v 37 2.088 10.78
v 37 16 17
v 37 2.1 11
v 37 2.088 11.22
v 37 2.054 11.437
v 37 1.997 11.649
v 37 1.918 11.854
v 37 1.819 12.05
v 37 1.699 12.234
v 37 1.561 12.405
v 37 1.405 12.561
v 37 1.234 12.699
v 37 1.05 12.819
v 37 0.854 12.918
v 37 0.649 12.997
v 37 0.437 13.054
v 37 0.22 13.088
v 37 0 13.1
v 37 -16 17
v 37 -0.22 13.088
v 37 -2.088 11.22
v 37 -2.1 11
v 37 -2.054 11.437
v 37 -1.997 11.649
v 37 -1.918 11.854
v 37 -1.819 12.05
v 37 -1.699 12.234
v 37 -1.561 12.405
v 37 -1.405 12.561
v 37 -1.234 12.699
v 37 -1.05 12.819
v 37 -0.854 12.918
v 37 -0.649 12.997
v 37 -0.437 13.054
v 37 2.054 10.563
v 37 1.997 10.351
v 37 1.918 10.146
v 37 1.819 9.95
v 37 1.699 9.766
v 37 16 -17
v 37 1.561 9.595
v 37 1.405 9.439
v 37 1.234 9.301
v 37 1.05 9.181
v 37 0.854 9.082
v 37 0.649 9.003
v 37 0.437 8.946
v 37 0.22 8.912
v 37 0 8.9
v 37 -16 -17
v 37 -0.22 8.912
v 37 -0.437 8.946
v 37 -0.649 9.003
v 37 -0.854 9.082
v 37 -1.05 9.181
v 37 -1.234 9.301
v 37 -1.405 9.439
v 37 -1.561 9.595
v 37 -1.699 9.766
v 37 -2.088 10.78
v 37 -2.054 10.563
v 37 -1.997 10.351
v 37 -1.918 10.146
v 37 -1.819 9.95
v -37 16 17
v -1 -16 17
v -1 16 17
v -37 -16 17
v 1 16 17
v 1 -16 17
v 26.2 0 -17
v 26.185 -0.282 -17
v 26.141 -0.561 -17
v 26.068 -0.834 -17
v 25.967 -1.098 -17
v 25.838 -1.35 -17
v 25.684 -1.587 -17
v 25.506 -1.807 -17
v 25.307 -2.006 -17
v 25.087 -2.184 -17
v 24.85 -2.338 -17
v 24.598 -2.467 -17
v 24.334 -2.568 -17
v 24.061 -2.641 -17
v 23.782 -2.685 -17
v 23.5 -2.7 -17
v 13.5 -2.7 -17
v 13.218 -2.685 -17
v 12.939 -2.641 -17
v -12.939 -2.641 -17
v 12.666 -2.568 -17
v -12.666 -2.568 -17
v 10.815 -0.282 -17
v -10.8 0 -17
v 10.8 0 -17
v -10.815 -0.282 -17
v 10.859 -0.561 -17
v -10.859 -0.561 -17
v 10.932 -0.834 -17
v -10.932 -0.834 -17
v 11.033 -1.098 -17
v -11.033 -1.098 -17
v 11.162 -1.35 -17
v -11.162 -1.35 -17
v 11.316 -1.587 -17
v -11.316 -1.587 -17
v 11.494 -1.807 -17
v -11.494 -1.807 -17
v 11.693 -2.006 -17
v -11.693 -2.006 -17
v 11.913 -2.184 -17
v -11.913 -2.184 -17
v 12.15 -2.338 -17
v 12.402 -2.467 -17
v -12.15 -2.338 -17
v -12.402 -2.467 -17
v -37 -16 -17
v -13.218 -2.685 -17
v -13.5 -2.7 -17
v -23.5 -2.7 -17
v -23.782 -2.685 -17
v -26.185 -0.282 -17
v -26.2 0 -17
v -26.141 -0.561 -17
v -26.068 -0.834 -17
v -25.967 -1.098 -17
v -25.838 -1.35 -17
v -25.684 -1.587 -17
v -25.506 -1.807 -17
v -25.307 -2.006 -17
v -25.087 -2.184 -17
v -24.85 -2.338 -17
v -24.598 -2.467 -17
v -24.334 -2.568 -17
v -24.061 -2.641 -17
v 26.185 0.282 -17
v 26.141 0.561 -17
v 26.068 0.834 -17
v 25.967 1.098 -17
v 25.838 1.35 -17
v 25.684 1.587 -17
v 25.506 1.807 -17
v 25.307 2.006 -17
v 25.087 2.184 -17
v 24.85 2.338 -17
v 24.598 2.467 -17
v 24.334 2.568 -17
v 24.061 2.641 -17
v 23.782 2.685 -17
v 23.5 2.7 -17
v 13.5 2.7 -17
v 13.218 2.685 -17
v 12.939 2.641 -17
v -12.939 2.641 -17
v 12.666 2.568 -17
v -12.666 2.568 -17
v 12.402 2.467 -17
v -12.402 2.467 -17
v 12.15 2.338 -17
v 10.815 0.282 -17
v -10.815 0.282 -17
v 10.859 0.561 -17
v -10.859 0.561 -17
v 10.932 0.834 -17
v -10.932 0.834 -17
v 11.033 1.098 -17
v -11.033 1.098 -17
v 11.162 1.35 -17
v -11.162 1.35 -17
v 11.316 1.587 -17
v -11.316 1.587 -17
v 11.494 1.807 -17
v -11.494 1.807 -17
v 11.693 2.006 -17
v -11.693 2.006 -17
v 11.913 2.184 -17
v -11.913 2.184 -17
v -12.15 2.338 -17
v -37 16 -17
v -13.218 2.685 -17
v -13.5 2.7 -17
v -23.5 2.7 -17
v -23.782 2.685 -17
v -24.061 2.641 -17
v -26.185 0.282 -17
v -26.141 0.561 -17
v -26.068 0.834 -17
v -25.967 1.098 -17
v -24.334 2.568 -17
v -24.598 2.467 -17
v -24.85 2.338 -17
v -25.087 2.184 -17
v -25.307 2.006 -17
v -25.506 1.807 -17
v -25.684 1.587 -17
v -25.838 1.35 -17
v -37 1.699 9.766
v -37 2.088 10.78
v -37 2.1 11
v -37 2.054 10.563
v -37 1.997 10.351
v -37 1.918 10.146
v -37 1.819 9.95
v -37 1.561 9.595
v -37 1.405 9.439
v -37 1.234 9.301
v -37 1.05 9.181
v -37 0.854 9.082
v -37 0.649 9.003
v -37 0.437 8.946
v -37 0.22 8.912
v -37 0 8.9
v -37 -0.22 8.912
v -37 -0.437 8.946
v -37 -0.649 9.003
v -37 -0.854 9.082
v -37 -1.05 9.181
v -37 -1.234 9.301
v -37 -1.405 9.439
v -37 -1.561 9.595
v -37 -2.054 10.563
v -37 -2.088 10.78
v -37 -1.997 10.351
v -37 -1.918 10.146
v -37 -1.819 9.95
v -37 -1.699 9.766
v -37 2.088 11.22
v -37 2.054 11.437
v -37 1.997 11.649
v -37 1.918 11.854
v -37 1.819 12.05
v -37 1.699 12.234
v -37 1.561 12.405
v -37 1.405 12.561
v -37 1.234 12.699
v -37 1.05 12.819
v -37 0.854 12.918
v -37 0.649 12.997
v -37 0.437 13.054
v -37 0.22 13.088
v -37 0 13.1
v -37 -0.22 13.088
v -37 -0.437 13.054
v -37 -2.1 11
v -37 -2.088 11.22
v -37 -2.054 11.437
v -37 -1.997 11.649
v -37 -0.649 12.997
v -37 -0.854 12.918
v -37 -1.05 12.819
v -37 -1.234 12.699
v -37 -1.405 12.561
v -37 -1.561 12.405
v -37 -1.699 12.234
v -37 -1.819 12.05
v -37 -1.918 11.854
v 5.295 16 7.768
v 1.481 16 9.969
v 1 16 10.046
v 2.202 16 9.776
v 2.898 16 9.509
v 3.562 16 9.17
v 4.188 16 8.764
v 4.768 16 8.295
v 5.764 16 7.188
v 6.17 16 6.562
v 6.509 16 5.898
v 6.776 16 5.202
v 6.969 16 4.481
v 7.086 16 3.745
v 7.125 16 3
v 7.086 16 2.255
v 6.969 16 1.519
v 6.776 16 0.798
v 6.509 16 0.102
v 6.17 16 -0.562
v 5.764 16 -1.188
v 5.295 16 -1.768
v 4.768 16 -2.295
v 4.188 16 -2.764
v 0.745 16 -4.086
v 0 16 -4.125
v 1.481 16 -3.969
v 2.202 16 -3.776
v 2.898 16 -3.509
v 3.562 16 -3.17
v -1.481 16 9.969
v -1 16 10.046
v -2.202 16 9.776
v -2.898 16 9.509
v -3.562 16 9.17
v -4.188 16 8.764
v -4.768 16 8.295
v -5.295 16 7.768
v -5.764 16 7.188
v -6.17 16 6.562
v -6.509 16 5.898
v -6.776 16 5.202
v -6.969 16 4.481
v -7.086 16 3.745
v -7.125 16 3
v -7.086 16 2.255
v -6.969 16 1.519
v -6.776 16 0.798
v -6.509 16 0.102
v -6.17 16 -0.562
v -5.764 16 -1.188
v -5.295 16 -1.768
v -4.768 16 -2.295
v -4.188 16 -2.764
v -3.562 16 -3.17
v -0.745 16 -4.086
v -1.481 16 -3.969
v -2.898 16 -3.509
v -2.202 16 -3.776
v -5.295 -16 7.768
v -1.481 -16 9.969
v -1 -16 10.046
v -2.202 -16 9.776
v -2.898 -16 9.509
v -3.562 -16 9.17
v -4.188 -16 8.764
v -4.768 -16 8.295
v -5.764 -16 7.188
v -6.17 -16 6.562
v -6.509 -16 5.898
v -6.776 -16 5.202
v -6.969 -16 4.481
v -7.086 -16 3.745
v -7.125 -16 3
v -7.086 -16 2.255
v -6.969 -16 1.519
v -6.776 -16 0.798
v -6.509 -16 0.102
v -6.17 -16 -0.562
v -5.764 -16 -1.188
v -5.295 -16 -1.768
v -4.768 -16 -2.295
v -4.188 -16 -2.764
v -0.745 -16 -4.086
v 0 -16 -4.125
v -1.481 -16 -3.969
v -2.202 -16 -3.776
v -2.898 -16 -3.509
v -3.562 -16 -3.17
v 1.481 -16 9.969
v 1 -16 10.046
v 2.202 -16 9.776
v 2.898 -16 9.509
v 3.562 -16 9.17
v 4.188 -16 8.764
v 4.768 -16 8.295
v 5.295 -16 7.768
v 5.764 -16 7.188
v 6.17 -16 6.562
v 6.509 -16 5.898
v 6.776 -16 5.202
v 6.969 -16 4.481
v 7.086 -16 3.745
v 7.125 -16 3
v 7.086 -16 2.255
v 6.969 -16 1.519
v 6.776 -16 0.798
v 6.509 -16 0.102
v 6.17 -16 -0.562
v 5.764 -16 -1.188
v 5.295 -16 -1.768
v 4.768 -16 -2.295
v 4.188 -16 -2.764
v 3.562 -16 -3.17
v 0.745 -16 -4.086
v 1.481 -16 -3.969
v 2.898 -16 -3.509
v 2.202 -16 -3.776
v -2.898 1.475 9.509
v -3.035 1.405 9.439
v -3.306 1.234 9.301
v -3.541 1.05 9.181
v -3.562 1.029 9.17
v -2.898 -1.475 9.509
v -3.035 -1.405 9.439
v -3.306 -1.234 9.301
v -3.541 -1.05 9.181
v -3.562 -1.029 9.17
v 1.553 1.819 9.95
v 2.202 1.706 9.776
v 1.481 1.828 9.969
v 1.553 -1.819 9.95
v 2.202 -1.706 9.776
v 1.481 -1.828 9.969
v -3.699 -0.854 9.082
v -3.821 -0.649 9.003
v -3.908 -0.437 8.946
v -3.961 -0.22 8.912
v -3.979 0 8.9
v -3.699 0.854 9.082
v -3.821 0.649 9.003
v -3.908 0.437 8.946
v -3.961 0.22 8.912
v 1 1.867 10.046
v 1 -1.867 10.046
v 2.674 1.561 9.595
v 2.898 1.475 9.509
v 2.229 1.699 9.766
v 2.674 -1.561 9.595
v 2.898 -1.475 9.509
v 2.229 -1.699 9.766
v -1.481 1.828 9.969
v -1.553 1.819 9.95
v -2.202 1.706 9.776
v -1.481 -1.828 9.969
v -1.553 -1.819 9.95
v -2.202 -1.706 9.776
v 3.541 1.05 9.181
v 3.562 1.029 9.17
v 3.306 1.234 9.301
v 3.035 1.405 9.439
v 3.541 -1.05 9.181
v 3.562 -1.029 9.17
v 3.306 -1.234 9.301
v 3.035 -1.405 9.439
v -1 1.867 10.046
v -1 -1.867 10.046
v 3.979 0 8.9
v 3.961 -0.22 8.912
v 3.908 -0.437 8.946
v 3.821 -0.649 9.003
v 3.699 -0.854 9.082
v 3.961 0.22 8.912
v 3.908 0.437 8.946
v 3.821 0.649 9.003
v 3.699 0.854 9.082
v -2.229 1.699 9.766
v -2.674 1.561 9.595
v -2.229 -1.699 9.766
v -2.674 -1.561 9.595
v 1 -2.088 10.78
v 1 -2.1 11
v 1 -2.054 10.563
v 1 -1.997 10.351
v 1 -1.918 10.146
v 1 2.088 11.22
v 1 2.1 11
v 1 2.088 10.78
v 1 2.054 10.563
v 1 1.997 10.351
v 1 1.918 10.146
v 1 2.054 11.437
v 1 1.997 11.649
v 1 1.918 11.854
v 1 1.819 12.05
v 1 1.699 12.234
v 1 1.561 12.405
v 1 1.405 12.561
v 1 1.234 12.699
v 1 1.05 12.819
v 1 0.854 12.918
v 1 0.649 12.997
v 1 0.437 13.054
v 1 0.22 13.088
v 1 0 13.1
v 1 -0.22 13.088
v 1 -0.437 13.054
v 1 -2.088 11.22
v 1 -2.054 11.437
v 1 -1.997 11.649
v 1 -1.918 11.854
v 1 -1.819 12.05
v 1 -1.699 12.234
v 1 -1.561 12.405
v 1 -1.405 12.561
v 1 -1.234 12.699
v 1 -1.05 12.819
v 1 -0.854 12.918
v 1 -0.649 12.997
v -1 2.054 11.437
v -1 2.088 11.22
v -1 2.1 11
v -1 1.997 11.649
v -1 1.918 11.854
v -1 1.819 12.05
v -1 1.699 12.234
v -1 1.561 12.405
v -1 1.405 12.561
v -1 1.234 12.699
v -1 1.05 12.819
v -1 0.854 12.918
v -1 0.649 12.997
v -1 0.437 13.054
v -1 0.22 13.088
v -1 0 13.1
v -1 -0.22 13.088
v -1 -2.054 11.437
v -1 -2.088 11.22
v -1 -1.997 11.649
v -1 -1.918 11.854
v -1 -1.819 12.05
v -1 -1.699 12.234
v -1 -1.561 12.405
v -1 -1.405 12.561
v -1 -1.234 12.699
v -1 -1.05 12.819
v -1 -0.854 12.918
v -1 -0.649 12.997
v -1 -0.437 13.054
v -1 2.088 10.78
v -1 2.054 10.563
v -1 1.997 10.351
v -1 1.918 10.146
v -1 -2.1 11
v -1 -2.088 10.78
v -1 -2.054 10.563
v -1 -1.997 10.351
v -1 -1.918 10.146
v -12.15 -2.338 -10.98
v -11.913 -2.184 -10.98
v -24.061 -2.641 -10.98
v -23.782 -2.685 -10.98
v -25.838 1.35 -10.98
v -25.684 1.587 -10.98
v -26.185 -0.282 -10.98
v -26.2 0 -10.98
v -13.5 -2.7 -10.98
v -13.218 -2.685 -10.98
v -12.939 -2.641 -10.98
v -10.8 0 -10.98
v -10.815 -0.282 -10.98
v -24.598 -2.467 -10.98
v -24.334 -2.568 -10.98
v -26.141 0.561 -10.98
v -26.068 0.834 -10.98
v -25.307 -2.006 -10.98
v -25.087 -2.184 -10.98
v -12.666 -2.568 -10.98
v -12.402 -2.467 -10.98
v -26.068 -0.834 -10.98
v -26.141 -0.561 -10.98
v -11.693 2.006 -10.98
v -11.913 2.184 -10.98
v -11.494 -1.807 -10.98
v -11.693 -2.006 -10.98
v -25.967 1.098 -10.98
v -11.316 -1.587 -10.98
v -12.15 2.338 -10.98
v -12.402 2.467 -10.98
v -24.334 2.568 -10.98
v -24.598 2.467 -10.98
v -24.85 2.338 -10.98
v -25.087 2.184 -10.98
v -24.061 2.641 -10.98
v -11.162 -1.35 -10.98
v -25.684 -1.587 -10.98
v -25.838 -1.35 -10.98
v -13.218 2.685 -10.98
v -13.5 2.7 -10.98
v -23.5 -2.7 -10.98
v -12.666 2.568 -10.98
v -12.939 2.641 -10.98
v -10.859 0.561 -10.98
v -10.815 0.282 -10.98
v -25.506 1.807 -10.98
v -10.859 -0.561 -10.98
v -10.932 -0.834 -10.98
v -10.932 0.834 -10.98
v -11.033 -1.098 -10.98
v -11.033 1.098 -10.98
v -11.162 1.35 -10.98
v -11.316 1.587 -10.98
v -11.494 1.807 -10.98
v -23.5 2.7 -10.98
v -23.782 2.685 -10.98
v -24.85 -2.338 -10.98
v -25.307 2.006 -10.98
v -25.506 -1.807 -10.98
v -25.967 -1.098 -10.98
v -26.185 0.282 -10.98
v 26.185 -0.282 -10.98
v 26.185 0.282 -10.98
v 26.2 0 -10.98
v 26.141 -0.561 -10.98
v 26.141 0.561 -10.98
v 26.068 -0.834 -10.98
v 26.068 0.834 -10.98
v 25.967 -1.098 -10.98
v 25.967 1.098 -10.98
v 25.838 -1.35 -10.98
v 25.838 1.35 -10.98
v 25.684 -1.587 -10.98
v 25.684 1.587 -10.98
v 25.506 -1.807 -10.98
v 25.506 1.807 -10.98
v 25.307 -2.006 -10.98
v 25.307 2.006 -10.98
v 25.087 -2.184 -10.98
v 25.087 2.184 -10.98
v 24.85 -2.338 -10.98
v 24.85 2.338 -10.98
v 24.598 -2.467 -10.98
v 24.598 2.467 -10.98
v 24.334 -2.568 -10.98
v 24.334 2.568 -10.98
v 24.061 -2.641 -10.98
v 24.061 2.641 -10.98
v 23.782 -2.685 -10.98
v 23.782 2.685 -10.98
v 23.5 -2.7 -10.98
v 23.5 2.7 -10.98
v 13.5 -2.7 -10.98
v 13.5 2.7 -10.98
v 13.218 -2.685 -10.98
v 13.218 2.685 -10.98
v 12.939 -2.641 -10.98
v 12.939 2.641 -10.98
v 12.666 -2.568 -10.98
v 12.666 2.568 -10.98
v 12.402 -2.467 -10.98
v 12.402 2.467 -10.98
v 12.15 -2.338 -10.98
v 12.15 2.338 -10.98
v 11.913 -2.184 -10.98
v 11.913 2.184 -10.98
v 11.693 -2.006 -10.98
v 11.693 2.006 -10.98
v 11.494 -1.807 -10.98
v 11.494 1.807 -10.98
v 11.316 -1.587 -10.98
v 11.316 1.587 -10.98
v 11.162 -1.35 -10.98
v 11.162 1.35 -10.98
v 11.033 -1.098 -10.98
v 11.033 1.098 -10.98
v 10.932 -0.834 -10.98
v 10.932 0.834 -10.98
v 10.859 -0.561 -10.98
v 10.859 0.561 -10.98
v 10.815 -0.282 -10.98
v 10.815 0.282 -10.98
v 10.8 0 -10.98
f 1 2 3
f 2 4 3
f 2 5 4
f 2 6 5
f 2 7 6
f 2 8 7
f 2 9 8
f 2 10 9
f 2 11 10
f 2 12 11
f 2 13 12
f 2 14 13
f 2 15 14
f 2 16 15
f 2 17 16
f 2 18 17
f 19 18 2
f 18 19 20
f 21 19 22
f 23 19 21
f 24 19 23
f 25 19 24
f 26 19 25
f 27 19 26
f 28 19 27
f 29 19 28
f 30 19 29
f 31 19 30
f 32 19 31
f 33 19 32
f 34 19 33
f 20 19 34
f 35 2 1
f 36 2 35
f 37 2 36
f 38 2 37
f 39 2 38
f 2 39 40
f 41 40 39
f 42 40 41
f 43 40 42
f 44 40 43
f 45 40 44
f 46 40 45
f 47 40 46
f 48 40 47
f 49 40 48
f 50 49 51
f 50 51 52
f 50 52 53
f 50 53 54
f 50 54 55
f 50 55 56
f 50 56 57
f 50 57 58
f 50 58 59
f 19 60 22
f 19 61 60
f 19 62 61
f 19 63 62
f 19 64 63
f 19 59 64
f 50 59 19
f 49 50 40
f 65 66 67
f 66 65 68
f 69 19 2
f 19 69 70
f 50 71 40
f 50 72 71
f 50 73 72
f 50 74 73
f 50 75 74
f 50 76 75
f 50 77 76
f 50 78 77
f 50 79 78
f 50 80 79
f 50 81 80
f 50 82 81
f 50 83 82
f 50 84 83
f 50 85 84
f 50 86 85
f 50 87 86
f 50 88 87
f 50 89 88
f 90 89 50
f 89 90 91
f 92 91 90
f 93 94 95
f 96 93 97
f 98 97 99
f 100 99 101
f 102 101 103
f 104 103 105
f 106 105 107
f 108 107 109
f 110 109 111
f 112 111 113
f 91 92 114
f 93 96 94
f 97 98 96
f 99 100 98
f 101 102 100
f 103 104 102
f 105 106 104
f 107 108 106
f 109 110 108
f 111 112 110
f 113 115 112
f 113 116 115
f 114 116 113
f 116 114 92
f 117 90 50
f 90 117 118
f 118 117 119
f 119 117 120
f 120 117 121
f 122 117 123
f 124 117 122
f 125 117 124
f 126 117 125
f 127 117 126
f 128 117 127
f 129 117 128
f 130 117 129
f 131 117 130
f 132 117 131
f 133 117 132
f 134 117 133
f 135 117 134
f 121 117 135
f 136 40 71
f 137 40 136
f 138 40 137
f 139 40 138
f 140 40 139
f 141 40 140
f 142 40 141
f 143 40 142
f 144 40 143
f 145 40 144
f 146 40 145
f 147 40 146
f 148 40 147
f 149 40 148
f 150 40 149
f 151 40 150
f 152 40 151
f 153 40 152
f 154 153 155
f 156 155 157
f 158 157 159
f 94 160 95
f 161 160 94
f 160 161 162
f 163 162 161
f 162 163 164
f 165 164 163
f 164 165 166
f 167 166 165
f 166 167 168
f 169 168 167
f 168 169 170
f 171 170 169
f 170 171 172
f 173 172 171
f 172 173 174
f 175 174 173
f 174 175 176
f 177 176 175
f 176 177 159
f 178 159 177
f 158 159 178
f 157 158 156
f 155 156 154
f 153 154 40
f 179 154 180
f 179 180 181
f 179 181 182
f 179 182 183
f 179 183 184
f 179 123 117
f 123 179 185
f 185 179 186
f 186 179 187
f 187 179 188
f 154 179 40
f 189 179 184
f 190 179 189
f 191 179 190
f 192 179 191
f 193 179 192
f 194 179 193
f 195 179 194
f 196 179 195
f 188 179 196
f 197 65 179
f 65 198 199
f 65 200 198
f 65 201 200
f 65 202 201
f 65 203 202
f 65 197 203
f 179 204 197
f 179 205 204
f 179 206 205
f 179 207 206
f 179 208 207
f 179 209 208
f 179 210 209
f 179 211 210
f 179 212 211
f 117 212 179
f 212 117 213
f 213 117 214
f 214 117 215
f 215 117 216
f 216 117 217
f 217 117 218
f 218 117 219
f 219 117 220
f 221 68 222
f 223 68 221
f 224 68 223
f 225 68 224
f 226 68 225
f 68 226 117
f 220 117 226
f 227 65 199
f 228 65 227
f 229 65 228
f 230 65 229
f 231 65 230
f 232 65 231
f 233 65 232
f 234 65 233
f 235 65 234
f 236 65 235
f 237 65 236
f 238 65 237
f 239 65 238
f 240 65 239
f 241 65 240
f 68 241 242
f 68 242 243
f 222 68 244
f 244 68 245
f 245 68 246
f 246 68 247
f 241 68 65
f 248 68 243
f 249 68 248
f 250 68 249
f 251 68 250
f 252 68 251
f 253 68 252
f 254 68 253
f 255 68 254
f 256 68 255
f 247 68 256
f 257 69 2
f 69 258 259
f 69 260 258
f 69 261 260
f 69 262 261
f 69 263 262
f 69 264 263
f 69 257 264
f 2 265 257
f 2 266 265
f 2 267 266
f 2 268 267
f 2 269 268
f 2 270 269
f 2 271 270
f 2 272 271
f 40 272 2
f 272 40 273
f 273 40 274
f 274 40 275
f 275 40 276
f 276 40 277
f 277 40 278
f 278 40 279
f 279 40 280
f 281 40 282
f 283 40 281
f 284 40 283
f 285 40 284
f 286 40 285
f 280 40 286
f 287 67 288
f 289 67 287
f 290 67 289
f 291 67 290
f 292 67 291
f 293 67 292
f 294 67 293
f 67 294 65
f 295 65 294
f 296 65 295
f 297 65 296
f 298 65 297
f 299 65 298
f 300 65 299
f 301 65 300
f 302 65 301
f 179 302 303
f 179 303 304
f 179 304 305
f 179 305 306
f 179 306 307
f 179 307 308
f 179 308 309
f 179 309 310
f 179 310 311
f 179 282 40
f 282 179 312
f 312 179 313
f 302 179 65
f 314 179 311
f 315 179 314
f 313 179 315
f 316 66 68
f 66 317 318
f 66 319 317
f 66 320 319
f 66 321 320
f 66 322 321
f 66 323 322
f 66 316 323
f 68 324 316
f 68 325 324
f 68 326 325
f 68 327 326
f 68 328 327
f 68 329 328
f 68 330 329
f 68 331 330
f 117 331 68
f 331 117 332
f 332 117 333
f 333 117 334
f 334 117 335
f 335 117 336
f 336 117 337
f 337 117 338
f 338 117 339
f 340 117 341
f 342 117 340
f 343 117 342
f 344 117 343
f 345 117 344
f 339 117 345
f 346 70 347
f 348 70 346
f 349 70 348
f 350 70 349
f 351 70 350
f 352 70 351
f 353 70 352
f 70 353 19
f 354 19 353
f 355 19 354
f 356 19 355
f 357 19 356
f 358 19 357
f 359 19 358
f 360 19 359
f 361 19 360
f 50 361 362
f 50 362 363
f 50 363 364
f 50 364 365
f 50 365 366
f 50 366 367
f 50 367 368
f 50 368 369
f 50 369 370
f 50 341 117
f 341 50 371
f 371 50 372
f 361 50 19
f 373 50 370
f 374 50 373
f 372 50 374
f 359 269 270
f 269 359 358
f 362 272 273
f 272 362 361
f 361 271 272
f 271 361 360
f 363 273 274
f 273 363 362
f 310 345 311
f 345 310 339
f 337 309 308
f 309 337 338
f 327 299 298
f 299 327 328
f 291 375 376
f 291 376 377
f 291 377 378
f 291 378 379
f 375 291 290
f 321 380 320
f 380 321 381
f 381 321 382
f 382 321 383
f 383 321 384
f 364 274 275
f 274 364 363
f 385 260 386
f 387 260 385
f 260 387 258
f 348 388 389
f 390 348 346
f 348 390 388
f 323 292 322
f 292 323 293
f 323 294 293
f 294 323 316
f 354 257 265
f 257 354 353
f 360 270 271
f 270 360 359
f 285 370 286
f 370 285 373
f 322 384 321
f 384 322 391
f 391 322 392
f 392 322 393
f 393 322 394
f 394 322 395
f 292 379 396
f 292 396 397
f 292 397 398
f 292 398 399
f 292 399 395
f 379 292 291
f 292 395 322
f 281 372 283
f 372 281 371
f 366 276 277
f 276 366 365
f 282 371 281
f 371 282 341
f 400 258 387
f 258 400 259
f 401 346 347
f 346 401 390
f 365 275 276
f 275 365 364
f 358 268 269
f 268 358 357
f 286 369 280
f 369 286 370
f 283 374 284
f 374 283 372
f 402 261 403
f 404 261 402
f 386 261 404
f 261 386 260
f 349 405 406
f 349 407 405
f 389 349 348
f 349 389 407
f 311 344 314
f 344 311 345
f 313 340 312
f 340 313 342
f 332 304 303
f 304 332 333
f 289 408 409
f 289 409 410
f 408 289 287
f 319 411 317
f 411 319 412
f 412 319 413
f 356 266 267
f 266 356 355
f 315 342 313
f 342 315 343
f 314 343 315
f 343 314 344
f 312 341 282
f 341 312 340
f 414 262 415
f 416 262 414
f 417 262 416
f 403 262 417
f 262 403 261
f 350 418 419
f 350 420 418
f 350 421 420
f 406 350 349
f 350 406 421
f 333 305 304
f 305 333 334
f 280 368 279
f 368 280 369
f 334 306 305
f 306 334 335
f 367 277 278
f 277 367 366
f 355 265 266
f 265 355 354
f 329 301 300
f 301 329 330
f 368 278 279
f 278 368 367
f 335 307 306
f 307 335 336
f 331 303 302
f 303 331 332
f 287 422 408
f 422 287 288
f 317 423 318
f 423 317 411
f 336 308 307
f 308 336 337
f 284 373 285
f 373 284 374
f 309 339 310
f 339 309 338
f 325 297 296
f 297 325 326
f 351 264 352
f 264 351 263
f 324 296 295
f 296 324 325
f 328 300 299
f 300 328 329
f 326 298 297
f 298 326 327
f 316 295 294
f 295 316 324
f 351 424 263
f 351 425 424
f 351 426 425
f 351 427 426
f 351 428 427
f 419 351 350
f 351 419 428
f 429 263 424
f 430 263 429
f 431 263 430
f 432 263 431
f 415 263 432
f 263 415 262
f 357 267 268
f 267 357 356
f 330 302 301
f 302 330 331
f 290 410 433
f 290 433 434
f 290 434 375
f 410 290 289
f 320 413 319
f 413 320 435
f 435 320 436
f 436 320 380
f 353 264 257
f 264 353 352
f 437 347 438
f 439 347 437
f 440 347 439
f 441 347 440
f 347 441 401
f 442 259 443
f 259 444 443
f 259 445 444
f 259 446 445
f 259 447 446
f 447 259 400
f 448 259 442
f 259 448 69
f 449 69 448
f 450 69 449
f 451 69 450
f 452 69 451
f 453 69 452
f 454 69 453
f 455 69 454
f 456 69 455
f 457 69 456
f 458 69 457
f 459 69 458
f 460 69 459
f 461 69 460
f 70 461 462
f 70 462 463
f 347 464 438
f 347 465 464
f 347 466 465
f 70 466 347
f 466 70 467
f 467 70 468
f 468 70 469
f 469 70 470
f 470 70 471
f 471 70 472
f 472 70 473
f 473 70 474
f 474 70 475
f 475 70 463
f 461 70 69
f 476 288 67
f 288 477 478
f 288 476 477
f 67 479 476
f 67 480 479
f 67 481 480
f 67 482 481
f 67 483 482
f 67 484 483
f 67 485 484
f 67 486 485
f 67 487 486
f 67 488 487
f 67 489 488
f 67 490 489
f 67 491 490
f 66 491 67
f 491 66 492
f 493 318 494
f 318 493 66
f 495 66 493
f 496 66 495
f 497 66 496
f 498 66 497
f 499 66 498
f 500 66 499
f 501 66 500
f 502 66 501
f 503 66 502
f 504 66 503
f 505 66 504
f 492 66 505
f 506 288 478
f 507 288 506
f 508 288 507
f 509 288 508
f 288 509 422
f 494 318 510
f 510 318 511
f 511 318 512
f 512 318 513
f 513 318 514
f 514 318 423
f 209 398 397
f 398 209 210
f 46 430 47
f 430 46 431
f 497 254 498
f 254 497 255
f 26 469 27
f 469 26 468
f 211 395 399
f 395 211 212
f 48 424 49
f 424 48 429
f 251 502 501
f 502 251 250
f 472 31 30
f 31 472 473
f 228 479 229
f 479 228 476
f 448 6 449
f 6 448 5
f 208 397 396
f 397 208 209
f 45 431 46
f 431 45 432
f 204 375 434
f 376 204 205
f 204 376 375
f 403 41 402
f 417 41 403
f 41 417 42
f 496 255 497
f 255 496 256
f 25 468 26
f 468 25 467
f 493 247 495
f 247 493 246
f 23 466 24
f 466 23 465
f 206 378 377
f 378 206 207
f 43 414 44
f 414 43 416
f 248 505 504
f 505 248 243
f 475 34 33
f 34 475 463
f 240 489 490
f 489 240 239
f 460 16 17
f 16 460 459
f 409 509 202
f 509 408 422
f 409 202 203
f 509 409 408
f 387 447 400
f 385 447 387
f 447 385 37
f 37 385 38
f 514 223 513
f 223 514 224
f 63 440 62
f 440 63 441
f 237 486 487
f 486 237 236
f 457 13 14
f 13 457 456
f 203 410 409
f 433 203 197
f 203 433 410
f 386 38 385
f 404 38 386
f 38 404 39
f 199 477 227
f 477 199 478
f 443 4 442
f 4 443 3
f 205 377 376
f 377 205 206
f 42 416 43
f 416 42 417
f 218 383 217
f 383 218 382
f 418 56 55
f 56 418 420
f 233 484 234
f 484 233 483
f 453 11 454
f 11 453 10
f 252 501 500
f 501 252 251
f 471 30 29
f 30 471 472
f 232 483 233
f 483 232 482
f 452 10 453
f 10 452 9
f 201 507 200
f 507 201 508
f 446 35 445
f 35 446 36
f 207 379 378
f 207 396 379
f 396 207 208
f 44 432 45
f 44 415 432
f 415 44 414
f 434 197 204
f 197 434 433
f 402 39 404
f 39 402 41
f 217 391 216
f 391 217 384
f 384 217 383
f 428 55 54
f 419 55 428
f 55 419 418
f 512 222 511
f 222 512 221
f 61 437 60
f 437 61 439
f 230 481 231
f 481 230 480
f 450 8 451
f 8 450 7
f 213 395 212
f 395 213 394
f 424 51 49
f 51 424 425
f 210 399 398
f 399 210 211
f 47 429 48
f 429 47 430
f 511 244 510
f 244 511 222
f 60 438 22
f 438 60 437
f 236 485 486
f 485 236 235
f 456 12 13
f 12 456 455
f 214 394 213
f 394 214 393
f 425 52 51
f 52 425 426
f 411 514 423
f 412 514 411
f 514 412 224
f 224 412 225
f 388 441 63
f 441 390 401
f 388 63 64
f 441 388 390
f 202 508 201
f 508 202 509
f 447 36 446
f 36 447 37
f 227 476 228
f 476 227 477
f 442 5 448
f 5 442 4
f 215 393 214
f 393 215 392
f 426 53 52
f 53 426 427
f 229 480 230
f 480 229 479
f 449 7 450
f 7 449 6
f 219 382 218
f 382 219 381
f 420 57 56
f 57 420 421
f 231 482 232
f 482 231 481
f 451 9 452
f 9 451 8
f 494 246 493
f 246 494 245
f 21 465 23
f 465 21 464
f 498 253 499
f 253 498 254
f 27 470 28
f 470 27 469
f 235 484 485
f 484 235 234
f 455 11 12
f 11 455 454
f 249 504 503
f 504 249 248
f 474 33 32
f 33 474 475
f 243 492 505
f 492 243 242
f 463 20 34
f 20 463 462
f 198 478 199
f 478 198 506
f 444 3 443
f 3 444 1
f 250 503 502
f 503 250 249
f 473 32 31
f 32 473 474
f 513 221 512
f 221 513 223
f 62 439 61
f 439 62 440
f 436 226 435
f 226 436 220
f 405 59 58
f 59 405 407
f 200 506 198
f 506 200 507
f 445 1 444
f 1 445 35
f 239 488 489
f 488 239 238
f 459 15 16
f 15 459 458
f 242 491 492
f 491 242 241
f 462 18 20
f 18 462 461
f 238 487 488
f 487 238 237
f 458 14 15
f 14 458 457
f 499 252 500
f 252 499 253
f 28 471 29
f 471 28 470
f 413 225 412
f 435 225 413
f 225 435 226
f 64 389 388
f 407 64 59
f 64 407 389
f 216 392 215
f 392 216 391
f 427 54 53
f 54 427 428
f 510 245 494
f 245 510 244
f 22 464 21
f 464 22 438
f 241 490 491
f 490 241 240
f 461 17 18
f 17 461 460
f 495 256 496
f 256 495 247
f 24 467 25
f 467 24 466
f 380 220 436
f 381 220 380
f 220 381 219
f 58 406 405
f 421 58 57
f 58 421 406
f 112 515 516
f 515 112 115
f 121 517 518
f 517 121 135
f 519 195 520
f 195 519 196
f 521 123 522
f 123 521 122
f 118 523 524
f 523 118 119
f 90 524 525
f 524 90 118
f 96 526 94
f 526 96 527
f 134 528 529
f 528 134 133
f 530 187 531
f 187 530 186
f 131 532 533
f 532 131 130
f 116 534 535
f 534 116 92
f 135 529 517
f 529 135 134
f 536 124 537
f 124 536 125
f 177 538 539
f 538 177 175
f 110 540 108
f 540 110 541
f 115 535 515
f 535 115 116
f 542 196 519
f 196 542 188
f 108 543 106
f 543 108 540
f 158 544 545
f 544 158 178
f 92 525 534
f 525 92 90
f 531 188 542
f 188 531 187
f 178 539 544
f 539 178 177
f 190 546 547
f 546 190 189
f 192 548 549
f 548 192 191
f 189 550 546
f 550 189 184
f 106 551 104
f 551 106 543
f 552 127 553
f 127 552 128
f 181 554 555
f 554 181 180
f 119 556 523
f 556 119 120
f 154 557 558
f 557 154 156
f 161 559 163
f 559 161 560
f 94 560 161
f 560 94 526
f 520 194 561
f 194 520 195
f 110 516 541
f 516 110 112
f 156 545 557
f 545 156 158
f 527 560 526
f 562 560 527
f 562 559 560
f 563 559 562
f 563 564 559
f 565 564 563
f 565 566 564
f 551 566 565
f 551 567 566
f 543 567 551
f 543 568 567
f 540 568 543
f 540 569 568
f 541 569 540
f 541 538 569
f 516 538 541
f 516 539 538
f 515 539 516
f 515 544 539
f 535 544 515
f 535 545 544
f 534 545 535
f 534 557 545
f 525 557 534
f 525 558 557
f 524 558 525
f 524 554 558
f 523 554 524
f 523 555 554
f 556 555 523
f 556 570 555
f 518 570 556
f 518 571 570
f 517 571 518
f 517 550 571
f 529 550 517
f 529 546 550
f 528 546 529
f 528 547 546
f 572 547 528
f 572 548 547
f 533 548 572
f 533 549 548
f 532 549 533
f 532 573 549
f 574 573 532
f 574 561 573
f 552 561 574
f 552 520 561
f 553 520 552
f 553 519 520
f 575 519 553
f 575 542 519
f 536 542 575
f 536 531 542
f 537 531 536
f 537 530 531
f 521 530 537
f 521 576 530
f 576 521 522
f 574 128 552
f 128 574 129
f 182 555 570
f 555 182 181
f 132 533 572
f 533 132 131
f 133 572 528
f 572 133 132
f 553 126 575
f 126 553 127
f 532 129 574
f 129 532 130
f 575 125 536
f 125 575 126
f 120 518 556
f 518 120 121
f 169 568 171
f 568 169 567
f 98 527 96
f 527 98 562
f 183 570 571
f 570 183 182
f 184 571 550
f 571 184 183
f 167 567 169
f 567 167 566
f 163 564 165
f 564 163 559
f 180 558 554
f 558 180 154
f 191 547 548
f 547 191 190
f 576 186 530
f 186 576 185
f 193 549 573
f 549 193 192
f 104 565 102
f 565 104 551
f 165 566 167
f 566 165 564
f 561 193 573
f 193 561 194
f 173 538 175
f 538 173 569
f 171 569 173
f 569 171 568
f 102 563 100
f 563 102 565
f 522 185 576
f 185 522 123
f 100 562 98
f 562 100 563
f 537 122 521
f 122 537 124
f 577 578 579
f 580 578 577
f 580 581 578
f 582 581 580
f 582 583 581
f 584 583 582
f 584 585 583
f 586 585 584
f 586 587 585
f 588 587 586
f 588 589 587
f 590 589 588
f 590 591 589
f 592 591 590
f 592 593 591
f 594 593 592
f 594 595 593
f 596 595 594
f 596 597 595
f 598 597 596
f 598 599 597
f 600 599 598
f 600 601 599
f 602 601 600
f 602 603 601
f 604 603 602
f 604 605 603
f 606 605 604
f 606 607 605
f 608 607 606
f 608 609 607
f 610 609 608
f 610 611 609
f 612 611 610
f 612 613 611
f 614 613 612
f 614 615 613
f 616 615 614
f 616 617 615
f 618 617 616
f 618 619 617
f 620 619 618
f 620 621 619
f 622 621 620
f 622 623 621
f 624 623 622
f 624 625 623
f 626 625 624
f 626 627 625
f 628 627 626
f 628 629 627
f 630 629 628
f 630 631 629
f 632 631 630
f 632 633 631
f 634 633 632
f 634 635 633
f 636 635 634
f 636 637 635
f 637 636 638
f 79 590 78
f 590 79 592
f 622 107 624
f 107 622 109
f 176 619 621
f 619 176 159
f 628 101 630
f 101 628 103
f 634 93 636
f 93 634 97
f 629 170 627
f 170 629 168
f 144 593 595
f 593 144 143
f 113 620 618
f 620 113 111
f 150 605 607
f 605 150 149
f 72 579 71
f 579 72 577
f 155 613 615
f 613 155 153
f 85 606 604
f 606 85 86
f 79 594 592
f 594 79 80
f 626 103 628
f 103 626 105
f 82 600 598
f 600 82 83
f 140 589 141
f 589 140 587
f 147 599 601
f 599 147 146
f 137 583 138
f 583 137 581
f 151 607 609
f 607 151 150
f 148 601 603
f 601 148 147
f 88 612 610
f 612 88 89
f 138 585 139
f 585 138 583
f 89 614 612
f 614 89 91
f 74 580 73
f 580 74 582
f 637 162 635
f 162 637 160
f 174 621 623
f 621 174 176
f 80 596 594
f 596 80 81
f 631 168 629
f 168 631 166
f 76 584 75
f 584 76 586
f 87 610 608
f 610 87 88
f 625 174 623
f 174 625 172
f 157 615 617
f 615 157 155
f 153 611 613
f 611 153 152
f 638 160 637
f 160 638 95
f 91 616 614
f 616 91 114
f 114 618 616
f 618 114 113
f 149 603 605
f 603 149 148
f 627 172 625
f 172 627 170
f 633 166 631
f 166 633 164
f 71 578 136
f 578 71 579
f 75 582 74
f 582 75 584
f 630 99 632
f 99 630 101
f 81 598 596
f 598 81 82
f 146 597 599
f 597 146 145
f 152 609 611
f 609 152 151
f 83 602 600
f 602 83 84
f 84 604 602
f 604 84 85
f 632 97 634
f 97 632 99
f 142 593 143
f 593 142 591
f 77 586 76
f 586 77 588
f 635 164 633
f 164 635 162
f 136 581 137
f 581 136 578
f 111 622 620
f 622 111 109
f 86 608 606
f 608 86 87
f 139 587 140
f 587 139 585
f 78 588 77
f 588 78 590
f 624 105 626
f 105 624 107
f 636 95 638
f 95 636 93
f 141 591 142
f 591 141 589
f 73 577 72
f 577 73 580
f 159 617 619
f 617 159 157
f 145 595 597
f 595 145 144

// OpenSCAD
// Clamp pedestal for 14 mm shaft.
$fn = 60;
eps = 0.02;
shaft_d = 14;
body_l = 74;
body_d = 32;
body_h = 34;
base_t = 6;
slot_w = 2;
mount_d = 5.4;
module mount_slot(x) {
    hull() {
        translate([x - 5, 0, -body_h / 2 - eps]) cylinder(d = mount_d, h = base_t + 2 * eps);
        translate([x + 5, 0, -body_h / 2 - eps]) cylinder(d = mount_d, h = base_t + 2 * eps);
    }
}
difference() {
    cube([body_l, body_d, body_h], center = true);
    translate([0, -body_d / 2 - eps, 3]) rotate([-90, 0, 0]) cylinder(d = shaft_d + 0.25, h = body_d + 2 * eps);
    translate([-slot_w / 2, -body_d / 2 - eps, 3]) cube([slot_w, body_d + 2 * eps, body_h / 2 + eps]);
    translate([-body_l / 2 - eps, 0, body_h / 2 - 6]) rotate([0, 90, 0]) cylinder(d = 4.2, h = body_l + 2 * eps);
    mount_slot(-body_l / 4);
    mount_slot(body_l / 4);
}
